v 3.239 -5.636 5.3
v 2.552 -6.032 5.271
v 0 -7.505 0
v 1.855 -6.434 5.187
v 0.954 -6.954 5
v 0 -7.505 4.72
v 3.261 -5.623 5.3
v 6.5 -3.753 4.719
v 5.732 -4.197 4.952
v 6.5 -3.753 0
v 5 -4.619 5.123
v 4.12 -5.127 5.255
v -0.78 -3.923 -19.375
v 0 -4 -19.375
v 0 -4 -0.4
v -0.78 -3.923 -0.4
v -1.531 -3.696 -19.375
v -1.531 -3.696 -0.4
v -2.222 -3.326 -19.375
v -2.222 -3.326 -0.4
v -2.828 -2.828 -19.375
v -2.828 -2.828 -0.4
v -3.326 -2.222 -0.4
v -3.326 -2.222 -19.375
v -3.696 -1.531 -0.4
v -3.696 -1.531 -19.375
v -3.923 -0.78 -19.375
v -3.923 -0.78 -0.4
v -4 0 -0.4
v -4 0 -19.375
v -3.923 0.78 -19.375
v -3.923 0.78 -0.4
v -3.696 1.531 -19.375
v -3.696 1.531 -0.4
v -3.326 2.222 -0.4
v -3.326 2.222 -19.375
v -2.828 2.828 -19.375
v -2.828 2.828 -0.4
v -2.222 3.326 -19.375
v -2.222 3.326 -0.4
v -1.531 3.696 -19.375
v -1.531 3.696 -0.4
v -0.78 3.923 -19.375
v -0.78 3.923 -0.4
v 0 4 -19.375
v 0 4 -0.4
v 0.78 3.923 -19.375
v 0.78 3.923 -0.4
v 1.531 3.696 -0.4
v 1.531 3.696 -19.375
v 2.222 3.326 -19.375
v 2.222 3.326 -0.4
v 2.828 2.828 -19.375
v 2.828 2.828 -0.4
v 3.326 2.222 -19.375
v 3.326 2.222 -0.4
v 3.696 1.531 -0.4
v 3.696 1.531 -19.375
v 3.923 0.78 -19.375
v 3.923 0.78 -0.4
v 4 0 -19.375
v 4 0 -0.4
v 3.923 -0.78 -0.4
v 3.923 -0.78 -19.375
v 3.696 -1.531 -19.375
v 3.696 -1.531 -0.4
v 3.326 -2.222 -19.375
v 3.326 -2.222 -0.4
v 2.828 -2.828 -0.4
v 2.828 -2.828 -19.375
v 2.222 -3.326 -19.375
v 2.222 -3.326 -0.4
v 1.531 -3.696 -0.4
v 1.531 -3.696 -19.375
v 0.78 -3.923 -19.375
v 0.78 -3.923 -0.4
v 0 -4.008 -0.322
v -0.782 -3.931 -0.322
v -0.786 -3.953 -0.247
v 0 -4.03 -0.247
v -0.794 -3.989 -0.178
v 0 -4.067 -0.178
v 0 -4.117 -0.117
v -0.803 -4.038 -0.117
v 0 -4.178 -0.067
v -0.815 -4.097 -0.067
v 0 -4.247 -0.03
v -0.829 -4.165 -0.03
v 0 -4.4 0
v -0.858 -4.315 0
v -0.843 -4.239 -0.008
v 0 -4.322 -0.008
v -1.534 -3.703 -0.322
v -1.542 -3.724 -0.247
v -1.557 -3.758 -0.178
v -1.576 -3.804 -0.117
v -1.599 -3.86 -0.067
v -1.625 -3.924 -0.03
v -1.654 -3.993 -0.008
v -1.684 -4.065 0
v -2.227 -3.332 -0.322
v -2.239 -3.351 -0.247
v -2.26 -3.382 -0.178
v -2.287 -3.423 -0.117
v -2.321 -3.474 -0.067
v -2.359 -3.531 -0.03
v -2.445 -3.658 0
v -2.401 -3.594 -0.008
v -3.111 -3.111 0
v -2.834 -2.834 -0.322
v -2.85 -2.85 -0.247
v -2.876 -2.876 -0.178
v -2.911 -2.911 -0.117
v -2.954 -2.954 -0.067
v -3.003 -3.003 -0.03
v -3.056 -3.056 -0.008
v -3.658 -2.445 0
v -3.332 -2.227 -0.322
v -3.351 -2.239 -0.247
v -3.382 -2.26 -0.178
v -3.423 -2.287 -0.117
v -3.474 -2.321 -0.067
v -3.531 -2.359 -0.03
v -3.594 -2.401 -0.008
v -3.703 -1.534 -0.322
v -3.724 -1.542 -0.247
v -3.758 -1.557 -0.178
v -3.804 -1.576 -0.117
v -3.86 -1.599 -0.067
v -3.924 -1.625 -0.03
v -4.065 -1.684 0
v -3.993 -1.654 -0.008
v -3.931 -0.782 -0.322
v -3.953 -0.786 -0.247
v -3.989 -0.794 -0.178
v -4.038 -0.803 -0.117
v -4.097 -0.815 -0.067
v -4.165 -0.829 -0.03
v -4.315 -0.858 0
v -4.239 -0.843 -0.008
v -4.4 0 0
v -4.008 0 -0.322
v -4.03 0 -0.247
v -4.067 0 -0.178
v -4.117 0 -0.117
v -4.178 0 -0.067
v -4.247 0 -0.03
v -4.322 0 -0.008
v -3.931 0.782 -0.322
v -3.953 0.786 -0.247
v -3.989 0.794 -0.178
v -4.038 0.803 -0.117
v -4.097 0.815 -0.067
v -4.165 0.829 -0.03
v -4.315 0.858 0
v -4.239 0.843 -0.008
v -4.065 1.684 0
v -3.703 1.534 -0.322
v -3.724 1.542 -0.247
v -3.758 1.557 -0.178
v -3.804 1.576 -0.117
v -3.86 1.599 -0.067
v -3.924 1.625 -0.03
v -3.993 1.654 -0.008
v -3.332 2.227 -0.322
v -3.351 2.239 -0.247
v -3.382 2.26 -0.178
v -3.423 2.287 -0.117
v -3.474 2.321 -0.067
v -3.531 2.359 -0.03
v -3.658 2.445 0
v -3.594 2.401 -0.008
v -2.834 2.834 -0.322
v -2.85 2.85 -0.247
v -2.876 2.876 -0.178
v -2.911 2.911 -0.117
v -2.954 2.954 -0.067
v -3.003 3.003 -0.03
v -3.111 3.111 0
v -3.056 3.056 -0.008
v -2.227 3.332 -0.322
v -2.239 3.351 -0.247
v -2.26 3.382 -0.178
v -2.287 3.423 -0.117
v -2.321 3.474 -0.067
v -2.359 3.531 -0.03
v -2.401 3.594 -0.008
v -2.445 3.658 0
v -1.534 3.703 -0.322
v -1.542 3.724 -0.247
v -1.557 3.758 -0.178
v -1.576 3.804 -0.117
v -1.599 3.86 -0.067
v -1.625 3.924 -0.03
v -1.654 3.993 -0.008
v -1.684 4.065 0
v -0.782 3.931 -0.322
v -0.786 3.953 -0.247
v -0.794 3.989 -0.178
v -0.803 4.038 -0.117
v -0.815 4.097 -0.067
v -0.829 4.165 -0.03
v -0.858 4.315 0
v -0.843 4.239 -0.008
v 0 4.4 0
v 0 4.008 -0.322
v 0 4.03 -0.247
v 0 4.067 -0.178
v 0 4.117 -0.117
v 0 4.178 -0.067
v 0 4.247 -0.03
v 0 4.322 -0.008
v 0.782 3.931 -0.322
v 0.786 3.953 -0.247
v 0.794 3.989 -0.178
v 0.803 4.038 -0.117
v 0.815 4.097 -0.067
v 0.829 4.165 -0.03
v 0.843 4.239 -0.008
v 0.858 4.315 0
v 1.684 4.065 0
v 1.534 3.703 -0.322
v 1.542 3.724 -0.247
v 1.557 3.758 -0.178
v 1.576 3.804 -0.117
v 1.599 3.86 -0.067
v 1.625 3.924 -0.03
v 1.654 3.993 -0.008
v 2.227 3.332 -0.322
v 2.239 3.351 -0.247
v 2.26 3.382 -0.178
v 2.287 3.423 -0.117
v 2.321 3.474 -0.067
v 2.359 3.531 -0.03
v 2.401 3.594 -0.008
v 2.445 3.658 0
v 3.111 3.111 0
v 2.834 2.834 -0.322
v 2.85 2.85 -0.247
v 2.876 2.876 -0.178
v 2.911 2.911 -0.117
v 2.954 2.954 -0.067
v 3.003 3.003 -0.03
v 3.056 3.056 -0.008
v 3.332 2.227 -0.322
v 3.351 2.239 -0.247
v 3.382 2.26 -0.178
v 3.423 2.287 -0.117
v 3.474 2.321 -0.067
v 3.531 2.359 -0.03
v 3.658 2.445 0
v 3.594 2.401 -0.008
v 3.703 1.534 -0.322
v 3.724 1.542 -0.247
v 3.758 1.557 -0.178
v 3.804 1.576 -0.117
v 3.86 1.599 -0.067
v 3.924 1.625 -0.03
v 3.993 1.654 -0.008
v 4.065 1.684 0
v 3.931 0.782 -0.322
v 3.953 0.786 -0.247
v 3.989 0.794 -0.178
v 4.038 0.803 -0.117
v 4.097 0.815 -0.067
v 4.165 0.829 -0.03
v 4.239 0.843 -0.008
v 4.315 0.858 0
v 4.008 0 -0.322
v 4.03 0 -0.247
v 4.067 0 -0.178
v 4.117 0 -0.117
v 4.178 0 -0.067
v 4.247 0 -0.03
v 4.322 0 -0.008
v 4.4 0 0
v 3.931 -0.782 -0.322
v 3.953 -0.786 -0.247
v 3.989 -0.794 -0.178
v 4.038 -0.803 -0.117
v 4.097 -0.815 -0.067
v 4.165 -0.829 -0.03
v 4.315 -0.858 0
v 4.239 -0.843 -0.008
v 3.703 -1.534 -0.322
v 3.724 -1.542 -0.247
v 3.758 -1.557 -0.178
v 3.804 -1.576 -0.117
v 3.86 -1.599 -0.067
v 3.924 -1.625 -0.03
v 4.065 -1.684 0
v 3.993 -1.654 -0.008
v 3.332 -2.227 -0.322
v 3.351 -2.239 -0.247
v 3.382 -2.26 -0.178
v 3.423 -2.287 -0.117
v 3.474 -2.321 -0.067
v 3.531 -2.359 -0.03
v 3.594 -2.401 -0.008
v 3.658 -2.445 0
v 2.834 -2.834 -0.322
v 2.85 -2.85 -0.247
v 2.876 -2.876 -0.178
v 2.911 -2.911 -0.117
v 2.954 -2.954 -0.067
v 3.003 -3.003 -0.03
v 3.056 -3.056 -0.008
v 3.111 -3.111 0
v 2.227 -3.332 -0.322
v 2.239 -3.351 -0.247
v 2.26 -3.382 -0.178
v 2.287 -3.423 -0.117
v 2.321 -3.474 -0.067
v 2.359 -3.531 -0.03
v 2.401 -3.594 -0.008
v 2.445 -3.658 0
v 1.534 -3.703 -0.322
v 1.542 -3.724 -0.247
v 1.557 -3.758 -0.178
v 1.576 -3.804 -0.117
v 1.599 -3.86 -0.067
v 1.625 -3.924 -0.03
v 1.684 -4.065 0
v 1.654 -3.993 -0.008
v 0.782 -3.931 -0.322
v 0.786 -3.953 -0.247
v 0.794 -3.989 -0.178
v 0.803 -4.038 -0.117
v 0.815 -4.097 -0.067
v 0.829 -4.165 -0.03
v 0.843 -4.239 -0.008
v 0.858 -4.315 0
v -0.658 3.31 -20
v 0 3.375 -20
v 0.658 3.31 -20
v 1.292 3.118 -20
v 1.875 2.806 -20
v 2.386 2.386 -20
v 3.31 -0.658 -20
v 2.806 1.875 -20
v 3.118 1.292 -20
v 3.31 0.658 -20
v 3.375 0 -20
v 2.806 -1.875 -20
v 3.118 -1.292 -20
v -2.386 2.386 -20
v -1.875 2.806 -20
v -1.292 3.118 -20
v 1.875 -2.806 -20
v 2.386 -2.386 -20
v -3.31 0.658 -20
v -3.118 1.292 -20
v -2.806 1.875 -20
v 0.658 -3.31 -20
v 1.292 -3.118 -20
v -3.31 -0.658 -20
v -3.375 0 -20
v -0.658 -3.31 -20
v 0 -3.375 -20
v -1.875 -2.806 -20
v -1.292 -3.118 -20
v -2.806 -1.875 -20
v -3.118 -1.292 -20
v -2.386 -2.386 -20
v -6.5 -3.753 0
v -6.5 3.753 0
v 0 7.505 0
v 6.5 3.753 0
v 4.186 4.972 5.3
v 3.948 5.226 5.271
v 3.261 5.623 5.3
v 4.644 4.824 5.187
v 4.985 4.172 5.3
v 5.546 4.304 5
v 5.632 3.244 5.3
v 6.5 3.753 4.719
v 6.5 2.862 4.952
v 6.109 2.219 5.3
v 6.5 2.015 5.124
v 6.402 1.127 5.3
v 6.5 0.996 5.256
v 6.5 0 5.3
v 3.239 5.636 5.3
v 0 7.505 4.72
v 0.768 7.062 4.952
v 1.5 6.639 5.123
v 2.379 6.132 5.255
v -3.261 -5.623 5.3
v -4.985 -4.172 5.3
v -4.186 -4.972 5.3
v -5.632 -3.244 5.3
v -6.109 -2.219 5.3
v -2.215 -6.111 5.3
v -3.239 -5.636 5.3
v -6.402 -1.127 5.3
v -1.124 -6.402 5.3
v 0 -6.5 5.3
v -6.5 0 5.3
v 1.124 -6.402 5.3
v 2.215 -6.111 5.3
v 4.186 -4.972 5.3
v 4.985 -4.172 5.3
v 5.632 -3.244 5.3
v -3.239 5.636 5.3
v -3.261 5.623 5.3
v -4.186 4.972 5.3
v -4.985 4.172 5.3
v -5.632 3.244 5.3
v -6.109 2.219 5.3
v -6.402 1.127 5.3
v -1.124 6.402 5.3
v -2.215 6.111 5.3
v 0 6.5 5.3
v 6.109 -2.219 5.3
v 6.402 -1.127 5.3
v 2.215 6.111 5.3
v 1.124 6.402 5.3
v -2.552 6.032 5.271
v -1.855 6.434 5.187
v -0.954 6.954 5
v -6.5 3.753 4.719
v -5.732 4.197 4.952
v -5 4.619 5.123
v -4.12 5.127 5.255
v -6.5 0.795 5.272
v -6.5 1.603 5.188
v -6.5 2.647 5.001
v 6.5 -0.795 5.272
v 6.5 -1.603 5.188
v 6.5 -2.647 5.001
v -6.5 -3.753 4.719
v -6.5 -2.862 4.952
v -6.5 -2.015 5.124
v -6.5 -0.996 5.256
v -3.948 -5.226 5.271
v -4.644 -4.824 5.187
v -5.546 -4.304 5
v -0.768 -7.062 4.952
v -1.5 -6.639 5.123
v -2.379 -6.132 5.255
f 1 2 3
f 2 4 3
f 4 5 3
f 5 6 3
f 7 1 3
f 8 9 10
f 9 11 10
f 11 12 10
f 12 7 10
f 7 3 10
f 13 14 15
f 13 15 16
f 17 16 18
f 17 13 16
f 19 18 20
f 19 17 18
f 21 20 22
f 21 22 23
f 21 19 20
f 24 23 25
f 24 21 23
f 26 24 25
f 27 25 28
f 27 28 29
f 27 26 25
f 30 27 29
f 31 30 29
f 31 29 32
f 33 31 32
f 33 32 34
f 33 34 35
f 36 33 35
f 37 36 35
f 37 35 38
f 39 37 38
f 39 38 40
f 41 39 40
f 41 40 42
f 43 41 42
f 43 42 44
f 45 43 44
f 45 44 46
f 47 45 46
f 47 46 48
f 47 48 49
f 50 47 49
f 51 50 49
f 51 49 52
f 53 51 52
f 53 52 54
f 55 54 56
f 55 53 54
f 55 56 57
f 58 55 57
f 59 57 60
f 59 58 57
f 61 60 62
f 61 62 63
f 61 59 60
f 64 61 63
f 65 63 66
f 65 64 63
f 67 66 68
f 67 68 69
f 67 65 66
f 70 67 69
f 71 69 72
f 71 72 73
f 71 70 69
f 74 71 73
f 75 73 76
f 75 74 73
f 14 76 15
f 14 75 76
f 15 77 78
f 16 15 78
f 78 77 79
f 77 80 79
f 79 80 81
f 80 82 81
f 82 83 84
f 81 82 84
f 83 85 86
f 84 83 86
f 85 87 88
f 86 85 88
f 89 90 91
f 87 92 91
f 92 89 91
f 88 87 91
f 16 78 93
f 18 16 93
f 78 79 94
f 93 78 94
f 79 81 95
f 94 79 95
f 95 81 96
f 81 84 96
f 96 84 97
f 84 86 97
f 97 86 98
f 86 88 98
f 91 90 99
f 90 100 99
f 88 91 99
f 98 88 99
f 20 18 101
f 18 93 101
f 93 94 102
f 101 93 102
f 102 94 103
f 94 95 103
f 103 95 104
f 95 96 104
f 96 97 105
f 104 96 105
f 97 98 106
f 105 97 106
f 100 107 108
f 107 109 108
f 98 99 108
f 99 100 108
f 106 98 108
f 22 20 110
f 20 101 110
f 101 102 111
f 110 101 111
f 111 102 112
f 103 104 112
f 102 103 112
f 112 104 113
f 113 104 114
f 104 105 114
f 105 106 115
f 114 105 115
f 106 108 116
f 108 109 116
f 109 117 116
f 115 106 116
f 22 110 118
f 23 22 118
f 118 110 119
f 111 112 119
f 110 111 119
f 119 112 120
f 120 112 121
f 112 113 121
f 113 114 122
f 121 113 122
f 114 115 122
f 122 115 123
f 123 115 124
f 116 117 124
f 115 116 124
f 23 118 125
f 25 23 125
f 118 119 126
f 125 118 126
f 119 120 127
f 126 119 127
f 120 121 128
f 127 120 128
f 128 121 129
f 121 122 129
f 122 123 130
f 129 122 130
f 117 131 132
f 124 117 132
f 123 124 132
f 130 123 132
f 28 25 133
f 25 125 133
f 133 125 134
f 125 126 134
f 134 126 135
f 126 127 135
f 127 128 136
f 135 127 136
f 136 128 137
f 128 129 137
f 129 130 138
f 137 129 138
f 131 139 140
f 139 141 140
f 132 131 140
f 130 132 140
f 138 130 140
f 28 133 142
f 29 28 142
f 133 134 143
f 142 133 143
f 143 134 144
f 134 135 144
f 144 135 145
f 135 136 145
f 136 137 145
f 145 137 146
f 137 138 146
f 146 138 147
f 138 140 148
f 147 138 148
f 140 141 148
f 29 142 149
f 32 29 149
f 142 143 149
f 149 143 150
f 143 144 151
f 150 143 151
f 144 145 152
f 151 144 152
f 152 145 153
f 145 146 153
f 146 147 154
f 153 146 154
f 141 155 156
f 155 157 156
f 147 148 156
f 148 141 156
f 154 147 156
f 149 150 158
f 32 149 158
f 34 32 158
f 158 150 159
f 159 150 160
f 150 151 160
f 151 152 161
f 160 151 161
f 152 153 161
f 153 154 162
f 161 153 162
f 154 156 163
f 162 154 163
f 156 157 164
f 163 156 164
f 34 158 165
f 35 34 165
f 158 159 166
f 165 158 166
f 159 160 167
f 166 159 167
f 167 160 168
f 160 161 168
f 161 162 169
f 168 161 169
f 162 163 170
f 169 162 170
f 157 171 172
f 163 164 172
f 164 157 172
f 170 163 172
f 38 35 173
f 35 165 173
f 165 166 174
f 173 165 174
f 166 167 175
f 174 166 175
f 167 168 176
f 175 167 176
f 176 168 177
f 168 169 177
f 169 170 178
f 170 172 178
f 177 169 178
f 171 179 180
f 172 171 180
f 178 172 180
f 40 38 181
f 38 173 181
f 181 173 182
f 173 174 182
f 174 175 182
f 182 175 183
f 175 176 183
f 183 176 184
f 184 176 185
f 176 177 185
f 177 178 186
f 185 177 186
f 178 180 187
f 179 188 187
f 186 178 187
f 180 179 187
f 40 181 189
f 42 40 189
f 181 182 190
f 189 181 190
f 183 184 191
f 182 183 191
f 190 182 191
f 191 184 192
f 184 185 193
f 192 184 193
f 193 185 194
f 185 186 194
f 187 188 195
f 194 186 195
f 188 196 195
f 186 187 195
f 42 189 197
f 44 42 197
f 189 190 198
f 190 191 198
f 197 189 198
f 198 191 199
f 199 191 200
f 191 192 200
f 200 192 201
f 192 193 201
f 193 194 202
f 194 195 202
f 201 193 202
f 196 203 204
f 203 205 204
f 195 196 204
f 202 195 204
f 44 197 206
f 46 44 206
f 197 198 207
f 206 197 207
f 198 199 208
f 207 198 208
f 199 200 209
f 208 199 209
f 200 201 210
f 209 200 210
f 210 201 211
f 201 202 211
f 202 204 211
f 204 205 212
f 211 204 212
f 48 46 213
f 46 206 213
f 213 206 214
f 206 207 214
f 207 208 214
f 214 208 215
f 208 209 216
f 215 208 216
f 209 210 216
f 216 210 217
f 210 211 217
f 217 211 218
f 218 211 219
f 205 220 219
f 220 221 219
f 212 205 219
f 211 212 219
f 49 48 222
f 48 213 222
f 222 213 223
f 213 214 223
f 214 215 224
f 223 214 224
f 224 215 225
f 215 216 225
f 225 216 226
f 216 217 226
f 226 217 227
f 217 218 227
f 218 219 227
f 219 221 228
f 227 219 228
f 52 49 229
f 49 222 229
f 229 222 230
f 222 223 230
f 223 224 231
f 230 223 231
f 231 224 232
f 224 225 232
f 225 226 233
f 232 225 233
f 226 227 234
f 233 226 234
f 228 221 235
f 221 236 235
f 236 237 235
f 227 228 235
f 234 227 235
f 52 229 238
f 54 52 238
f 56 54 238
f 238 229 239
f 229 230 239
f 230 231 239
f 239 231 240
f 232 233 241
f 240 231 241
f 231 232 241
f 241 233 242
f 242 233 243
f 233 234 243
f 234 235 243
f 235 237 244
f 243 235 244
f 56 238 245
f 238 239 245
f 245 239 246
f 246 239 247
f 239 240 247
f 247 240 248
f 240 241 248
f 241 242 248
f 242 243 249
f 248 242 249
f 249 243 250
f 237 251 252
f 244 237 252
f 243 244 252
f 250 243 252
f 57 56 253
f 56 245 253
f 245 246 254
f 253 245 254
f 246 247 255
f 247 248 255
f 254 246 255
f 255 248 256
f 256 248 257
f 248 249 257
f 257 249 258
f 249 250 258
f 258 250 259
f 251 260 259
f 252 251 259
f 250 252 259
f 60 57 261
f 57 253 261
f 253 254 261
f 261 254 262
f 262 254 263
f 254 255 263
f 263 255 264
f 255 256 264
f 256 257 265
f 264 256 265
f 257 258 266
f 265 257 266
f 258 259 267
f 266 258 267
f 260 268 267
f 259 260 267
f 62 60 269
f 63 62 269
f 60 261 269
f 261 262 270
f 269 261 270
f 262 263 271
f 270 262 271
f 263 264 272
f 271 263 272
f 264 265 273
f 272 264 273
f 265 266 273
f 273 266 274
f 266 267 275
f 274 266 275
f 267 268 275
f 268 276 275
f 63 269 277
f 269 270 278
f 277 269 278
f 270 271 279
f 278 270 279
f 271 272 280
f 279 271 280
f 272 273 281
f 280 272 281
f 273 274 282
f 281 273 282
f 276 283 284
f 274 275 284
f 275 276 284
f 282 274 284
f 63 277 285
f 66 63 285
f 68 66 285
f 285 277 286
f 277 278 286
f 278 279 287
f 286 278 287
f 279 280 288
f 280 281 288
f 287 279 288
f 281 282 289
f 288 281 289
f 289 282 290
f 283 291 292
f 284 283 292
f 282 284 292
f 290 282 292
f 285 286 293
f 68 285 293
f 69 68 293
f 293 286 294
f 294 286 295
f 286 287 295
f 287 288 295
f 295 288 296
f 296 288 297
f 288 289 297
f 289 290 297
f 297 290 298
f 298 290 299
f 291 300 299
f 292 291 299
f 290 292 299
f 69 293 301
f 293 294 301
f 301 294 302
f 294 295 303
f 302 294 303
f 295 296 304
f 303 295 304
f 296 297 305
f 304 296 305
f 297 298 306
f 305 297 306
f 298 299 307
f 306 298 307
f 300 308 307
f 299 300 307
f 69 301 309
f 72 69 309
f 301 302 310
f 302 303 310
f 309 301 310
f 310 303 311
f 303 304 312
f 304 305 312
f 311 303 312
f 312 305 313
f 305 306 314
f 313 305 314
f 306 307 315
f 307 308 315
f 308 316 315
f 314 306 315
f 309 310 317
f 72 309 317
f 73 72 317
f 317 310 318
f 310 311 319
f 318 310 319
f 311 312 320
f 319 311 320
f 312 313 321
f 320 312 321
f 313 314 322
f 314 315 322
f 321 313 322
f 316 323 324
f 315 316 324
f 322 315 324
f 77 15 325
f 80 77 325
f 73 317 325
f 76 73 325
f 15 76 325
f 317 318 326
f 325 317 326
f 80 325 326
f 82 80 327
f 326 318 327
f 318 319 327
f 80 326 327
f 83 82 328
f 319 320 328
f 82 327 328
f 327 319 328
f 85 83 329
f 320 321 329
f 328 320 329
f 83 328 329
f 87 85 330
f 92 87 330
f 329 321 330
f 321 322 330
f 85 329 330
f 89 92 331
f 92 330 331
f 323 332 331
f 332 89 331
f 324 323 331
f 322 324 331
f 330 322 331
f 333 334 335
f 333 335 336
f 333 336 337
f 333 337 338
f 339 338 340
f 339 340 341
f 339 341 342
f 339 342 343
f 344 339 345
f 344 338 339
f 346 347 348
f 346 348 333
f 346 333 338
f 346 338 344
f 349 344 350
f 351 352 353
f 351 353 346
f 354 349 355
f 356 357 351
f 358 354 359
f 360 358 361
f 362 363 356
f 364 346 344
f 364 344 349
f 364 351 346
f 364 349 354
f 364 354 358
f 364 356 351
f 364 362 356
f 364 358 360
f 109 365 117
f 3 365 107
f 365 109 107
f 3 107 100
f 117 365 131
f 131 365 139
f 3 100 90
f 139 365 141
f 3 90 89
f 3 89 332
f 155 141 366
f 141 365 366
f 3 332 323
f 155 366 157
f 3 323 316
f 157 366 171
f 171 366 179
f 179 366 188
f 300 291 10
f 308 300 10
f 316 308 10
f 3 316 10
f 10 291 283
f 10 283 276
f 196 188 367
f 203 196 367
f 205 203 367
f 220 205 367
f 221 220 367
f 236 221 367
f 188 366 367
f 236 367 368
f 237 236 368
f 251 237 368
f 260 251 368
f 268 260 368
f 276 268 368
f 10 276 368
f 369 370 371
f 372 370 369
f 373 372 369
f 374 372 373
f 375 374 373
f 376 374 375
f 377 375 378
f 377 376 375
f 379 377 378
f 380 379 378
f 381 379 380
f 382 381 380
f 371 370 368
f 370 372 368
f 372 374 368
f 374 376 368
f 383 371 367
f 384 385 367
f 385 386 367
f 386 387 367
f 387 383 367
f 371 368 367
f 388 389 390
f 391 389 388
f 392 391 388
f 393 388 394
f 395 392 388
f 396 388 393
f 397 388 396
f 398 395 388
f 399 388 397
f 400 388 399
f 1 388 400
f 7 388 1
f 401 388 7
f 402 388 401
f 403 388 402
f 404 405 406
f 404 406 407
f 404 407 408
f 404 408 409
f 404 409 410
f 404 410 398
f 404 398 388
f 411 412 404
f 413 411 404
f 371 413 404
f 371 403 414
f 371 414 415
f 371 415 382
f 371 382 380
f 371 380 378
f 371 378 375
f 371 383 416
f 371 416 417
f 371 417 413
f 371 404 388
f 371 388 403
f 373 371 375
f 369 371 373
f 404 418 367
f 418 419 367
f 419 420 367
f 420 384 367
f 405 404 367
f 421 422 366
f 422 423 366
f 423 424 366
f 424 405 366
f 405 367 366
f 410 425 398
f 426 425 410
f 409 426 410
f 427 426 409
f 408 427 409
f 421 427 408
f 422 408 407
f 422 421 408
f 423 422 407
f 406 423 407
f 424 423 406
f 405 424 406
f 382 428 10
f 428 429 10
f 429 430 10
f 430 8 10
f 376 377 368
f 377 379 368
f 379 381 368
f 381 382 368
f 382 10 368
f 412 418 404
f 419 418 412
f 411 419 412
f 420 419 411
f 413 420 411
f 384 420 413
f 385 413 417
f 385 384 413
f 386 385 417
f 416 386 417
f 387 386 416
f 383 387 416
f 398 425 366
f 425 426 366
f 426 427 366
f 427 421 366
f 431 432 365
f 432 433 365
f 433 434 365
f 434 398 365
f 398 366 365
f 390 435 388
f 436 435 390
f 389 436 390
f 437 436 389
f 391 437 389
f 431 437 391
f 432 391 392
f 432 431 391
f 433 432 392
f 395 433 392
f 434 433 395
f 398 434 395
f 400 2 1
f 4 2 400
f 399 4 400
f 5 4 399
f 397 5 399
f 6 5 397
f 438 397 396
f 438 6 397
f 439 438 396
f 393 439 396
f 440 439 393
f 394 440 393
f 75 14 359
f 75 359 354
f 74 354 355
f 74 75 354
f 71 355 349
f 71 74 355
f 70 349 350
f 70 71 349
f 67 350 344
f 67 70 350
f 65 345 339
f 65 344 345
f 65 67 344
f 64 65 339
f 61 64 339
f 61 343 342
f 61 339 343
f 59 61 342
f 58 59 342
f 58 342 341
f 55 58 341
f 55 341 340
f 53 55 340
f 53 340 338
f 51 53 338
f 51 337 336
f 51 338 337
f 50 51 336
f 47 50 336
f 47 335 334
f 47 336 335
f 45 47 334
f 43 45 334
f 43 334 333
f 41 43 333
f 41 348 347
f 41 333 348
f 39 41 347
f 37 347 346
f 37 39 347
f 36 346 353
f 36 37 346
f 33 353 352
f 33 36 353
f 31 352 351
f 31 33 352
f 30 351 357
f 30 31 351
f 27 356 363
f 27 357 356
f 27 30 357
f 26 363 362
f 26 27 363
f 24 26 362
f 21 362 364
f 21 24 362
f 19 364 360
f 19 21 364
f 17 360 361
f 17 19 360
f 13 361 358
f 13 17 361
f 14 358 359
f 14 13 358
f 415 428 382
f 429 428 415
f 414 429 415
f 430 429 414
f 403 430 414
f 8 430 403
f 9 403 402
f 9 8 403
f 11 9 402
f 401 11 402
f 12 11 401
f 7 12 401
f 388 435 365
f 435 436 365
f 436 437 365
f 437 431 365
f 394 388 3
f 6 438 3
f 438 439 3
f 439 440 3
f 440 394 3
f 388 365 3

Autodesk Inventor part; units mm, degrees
ref_plane "WorkPlane1" through (0, 0, 0) normal (0, 0, 1) x (1, 0, 0)
sketch "Sketch1" plane through (0, 0, 0) normal (0, 0, 1) x (1, 0, 0)
  point P0 (0, 0)
sketch "Sketch2" plane through (0, 0, 0) normal (0, 0, 1) x (1, 0, 0)
  line L0 (-6.5, 3.7529) -> (-6.5, -3.7529)
  line L1 (0, 7.5054) -> (-6.5, 3.7529)
  line L2 (6.5, 3.7529) -> (0, 7.5054)
  line L3 (6.5, -3.7529) -> (6.5, 3.7529)
  line L4 (0, -7.5054) -> (6.5, -3.7529)
  line L5 (-6.5, -3.7529) -> (0, -7.5054)
  circle A0 centre (0, 0) radius 6.5 construction
  dimension "d1" = 13
  dimension "d29" = 0
  dimension "d30" = 0
extrude "Extrusion1" add sketch "Sketch2" along normal blind 5.3
sketch "Sketch3" plane through (0, 0, 0) normal (1, 0, 0) x (0, 1, 0)
  line L0 (6.5, 5.3) -> (7.6054, 5.3)
  line L1 (7.6054, 4.6618) -> (6.5, 5.3)
  line L2 (7.6054, 5.3) -> (7.6054, 4.6618)
  line L3 (0, -1.06) -> (0, 6.36) projected
  line L4 (7.5054, 0) -> (7.5054, 5.3) projected
  dimension "d25" = 0.1
  dimension "d26" = 0
  dimension "d27" = 60
  dimension "d28" = 6.5
revolve "Revolution1" cut sketch "Sketch3" angle 360 about axis through (0, 0, -10) along (0, 0, 1)
sketch "Sketch4" plane through (0, 0, 0) normal (1, 0, 0) x (0, 1, 0)
  line L0 (0, -20) -> (0, 0)
  line L1 (-4, -20) -> (0, -20)
  line L2 (-4, 0) -> (-4, -20)
  line L3 (0, 0) -> (-4, 0)
  line L4 (0, -20) -> (0, 0)
  line L5 (-4.8, 0) -> (0.8, 0) projected
  line L6 (0, -24) -> (0, 4) projected
  dimension "d18" = 4
  dimension "d20" = 20
  dimension "d33" = 0
  dimension "d34" = 0
revolve "Revolution2" add sketch "Sketch4" angle 360 about axis through (0, 0, -20) along (0, 0, -1)
chamfer "Chamfer1" distance 0.625 angle 45 1 edges at (0, 4, -20)
fillet "Fillet1" radius 0.4 1 edges at (0, 4, 0)
thread "Thread1" size "M8x1.25" class "6g" standard "ISO Metric profile" length 17.5
ref_plane "MSC_PF1" through (0, 0, 0) normal (1, 0, 0) x (0, 1, 0)
ref_plane "MSC_PT1" through (0, 0, 0) normal (0, 0, -1) x (-1, 0, 0)
equation "\"d22\" = 0.5 * PTC"
equation "\"d23\" = 0.5 * PTC"
equation "\"d24\" = r"
equation "\"d1\" = ParS"
equation "\"d6\" = ParK"
equation "\"b\" = NLG - 2 * PTC"
equation "\"d28\" = 0.5 * ParS"
equation "\"d18\" = 0.5 * NND"
equation "\"d20\" = NLG"
equation "\"NND\" = 8"
equation "\"NLG\" = 20"
equation "\"PTC\" = 1.25"
equation "\"ParK\" = 5.3"
equation "\"ParS\" = 13"
equation "\"msp_es\" = 0.577367 * ParS"
equation "\"r\" = 0.4"
equation "\"THREADDIA\" = NND"
properties part number "ISO 4018 - M8 x 20" material "Steel"
